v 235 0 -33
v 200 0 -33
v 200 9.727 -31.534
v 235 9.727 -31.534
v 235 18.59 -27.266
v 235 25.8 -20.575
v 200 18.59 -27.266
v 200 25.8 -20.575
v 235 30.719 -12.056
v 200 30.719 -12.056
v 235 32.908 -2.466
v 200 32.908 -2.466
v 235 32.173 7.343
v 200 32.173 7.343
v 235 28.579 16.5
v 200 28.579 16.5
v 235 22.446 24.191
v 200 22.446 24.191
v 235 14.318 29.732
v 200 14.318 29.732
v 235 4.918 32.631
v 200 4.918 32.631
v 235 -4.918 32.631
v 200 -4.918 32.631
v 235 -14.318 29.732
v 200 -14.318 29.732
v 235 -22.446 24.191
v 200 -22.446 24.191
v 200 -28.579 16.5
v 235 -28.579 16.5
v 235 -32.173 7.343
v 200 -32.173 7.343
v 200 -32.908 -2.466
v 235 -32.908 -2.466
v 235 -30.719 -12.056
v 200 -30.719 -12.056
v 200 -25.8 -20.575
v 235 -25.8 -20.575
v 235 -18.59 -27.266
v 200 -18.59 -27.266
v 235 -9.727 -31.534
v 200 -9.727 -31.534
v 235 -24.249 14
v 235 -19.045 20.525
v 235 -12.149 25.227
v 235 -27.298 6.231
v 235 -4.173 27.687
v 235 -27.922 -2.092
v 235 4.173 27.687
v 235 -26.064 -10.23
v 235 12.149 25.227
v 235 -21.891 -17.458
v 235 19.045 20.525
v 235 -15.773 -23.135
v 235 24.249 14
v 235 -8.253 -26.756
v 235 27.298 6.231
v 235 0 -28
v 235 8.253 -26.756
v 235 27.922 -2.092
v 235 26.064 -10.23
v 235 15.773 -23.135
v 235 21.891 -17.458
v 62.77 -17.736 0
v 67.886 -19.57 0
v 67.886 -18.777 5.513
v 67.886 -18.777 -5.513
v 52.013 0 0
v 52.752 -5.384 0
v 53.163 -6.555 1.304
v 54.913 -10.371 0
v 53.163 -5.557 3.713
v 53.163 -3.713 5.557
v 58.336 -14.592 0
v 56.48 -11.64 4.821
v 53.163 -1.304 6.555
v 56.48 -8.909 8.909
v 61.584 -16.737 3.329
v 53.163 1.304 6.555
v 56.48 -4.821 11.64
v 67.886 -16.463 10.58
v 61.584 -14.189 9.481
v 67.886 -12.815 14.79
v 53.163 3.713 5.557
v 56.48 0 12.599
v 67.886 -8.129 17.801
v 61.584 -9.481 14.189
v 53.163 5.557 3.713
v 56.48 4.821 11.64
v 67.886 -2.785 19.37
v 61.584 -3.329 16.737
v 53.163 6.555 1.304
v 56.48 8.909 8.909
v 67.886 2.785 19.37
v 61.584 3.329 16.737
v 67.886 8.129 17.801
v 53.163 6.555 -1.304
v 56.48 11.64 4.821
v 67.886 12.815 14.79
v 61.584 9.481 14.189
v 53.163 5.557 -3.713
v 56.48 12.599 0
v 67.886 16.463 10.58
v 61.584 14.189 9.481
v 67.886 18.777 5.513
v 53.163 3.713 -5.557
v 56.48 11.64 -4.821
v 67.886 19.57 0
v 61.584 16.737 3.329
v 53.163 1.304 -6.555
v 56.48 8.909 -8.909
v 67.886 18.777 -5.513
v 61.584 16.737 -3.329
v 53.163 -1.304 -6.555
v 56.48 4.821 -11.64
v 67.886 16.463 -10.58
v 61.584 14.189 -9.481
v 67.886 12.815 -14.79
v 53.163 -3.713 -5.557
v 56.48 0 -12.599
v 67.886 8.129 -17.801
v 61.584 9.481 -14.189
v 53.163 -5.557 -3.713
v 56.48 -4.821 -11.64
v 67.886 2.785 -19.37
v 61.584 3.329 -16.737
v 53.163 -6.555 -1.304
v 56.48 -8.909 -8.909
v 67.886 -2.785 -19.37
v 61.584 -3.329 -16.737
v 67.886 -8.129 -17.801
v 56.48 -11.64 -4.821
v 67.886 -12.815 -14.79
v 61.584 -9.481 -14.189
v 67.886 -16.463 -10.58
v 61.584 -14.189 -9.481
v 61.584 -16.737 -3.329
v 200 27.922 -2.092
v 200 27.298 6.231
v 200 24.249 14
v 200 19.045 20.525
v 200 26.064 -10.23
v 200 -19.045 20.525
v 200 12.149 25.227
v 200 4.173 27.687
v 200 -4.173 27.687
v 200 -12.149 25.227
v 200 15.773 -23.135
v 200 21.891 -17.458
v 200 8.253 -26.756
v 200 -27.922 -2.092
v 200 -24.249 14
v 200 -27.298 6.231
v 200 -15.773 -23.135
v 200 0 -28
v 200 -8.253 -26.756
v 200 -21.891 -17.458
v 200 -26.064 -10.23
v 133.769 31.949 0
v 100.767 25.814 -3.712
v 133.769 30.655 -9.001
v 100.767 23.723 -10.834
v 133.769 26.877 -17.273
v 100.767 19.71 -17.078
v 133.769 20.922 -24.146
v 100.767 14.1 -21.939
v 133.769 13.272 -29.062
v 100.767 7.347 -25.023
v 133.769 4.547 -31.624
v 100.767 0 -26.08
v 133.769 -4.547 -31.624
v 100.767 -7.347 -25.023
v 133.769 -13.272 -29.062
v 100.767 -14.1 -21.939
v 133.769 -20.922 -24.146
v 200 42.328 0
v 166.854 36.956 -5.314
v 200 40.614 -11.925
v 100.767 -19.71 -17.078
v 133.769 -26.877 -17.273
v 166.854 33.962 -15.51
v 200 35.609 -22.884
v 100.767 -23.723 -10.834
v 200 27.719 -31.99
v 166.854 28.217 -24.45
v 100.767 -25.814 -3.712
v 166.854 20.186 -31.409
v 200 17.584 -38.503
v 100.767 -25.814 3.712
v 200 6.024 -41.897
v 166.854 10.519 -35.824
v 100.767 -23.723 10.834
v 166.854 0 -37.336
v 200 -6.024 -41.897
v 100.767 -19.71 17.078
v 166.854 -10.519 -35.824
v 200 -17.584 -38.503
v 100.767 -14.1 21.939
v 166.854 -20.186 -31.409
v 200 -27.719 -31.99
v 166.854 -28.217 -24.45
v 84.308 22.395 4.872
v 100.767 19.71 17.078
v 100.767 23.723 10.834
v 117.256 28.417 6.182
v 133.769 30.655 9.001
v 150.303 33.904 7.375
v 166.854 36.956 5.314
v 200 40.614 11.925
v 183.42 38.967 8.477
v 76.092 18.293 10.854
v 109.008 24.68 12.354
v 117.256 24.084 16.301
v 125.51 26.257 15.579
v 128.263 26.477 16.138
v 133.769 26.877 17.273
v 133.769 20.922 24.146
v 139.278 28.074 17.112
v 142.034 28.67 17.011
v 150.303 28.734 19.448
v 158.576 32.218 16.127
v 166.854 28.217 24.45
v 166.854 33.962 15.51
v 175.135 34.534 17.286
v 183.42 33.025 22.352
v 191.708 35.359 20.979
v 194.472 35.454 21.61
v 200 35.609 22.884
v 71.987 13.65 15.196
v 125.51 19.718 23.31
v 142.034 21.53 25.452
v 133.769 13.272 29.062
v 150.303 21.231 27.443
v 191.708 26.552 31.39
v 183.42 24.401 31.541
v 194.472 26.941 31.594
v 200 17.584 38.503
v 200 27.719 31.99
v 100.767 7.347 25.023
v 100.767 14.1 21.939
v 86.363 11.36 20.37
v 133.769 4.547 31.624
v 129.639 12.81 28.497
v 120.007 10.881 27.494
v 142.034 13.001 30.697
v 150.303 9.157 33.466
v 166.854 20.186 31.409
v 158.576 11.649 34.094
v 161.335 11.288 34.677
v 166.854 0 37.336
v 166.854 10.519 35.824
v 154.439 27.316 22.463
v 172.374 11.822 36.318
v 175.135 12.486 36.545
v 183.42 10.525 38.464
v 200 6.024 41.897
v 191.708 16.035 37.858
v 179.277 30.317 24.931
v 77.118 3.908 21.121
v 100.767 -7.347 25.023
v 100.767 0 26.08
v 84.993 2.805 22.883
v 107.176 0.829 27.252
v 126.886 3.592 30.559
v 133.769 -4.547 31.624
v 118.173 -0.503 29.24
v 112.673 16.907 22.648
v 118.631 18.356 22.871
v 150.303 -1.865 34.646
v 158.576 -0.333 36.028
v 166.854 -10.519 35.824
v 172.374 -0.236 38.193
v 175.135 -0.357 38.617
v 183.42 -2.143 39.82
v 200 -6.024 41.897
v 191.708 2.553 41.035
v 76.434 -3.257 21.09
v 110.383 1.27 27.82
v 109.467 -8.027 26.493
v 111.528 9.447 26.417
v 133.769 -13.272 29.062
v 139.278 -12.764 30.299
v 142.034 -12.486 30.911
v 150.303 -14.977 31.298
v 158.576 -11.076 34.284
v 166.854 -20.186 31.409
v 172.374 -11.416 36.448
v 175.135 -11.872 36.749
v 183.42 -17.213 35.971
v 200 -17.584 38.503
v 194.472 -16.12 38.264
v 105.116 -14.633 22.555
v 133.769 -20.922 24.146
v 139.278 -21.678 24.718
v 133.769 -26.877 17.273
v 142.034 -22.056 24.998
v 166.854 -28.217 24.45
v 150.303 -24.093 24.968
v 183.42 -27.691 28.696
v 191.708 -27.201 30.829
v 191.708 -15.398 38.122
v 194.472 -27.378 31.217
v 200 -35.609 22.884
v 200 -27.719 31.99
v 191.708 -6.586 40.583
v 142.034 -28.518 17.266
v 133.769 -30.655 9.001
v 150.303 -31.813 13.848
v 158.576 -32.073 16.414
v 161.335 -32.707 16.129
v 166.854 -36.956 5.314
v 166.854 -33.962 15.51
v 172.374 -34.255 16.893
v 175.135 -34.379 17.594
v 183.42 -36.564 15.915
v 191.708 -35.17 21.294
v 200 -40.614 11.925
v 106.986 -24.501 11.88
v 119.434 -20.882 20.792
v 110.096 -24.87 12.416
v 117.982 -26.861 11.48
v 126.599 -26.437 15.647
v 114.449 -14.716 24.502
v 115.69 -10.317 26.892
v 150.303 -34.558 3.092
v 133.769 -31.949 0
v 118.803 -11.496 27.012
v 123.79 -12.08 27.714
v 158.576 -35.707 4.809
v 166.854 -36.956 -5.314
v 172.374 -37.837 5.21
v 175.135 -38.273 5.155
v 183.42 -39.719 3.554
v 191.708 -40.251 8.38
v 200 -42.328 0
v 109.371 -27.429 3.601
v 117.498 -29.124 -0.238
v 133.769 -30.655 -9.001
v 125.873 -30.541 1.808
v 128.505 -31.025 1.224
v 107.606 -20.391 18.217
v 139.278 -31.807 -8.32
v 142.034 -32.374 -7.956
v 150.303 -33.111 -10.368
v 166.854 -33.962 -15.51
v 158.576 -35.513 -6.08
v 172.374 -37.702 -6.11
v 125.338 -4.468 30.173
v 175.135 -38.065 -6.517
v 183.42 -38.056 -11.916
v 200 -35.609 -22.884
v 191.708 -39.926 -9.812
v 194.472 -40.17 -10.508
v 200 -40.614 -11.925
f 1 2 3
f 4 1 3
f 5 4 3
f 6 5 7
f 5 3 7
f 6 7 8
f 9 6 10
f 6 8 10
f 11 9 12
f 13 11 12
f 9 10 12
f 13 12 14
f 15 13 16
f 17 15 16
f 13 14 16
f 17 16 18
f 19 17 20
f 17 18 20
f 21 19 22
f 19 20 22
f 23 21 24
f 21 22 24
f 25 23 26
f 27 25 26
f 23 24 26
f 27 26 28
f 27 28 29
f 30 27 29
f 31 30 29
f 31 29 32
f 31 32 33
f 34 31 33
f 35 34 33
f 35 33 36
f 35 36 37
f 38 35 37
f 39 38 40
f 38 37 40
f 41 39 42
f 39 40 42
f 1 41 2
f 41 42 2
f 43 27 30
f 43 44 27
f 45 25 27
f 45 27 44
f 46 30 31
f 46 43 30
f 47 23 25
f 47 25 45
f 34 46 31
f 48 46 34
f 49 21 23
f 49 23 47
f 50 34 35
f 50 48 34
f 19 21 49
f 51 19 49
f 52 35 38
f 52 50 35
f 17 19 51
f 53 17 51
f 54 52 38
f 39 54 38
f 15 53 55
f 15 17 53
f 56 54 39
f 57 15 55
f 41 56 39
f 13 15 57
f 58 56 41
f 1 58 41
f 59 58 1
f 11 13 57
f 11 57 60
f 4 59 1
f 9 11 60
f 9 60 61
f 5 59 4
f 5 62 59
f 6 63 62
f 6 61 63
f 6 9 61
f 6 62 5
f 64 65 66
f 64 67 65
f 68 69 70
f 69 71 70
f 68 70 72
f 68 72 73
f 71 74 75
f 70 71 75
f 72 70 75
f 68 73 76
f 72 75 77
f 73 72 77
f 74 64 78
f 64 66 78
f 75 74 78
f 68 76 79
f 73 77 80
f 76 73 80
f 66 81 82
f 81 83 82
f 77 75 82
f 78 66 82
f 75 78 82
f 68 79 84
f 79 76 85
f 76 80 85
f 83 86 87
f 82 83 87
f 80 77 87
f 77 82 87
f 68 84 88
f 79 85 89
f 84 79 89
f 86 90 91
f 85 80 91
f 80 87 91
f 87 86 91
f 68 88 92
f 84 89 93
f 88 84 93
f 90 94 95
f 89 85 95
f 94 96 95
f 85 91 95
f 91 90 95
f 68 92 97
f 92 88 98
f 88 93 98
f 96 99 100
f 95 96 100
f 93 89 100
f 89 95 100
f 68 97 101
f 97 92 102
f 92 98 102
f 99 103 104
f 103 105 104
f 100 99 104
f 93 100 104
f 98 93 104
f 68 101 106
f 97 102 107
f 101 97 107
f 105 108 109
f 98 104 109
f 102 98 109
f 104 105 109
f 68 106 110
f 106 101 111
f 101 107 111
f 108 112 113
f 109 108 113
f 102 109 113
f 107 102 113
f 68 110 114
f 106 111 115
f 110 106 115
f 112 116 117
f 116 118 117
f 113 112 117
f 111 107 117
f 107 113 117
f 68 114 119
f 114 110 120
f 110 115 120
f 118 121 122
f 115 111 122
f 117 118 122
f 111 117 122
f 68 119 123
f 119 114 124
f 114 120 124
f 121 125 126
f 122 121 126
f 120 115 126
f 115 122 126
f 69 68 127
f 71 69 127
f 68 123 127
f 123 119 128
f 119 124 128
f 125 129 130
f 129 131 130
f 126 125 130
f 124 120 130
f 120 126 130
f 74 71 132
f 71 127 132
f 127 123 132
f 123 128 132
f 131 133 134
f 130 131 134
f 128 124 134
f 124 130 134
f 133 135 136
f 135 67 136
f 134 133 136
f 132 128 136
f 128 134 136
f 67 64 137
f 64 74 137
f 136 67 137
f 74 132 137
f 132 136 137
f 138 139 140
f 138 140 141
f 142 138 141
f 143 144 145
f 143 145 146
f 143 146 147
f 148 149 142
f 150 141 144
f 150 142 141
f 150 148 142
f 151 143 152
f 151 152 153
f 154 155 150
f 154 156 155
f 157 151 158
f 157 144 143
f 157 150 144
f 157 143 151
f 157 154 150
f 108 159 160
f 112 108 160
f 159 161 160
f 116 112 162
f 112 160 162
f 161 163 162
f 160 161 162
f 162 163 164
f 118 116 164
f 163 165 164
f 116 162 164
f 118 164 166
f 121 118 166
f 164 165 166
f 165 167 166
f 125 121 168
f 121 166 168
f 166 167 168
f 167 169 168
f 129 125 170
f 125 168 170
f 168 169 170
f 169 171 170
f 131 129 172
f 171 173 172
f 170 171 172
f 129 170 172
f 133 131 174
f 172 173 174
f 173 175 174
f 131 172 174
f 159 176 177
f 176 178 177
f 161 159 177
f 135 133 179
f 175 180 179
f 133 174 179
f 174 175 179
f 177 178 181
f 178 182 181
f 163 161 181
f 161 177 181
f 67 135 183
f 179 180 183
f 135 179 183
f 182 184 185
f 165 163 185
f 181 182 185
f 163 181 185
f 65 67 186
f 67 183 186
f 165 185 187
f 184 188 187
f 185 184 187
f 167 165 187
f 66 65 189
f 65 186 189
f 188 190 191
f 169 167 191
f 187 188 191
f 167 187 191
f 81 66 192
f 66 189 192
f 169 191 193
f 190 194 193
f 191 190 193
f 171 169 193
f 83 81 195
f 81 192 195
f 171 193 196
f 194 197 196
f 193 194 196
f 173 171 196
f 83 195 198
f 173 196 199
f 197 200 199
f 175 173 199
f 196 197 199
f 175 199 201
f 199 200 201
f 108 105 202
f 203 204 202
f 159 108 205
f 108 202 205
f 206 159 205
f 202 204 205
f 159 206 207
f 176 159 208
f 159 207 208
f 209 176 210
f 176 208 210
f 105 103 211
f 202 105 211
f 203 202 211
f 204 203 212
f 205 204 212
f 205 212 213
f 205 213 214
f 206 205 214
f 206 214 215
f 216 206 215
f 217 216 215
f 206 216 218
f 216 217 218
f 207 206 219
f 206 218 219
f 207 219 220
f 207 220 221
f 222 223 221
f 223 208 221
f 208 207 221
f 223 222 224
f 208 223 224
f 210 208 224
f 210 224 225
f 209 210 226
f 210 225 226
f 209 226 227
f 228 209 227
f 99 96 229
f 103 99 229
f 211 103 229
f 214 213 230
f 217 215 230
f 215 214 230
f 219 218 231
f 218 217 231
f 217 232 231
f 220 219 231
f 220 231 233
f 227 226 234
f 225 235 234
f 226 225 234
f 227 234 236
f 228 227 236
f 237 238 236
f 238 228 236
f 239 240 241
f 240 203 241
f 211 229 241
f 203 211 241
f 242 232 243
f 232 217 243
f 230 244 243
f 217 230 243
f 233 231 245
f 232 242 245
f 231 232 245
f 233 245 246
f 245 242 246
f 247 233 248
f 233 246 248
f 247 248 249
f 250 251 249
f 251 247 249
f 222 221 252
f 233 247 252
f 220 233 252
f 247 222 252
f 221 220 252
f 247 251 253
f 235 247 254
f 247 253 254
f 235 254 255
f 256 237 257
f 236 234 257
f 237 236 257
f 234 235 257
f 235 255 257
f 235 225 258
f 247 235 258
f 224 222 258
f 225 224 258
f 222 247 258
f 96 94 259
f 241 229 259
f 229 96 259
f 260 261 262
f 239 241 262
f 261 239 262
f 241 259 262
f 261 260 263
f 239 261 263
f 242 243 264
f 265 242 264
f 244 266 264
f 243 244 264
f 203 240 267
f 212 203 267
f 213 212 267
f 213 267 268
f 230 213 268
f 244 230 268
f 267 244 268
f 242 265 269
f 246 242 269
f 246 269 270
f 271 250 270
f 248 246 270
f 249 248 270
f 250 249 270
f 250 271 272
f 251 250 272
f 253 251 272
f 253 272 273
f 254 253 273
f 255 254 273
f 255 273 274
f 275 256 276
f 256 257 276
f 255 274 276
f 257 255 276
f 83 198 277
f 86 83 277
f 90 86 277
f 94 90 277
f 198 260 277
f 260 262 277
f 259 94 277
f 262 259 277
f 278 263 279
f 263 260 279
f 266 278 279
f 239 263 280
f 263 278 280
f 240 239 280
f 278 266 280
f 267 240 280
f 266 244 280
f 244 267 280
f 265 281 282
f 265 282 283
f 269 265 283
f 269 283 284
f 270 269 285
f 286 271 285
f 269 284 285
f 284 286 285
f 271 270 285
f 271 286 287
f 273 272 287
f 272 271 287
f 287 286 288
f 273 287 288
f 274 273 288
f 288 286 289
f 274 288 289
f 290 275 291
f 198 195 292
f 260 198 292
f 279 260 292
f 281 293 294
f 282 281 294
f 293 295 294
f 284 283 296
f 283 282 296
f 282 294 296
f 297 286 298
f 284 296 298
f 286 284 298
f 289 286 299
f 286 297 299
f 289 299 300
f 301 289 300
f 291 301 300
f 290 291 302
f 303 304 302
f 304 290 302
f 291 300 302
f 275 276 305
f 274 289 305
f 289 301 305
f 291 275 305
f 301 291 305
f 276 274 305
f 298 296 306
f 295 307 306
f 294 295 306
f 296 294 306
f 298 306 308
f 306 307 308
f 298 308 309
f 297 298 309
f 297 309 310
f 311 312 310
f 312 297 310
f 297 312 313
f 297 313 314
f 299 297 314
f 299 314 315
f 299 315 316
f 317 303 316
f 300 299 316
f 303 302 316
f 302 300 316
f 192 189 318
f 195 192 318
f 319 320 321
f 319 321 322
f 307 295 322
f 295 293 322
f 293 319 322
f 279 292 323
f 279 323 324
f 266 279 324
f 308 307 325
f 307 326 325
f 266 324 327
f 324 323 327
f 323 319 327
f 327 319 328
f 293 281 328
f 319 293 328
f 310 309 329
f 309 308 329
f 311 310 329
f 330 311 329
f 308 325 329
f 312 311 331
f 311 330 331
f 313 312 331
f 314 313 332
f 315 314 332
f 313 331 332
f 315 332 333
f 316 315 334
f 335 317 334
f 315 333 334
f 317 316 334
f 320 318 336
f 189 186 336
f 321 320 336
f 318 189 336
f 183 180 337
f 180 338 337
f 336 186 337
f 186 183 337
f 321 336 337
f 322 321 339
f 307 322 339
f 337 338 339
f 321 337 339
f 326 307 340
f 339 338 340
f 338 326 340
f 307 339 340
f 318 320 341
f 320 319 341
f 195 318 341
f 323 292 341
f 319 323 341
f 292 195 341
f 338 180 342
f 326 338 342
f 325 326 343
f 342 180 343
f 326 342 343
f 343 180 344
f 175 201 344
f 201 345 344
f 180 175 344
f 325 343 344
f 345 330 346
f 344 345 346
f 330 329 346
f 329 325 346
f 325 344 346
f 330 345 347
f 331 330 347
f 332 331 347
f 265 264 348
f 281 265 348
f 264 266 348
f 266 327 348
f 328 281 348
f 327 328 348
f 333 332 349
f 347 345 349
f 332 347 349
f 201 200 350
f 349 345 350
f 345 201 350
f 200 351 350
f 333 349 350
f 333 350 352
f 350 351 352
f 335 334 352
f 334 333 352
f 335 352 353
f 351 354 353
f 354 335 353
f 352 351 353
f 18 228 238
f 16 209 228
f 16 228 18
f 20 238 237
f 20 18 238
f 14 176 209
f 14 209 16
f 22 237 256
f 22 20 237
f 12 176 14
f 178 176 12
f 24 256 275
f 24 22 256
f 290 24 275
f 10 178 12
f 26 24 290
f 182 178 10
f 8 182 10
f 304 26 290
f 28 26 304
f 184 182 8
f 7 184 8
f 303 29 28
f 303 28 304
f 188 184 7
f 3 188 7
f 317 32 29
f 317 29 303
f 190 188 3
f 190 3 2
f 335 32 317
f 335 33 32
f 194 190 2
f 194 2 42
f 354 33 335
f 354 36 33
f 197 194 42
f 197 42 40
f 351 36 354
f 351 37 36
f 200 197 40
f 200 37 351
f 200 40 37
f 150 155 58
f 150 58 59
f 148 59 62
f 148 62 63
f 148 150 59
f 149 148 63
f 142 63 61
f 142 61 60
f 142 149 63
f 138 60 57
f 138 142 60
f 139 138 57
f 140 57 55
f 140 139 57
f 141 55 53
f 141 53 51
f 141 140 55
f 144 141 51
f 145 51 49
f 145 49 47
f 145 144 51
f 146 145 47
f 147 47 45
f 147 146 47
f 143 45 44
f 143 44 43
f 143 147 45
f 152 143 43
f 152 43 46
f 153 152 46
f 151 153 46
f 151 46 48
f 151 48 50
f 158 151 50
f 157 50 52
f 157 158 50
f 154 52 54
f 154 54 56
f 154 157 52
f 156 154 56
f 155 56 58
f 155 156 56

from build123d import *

# Parameters (mm, degrees)
SKETCH3_R           = 33
SKETCH3_R_2         = 28
BOSS_EXTRUDE1_DEPTH = 35


with BuildPart() as part:
    # Sketch1 → Revolve1 (revolve)
    with BuildSketch(Plane.XY):
        with BuildLine():
            Line((200, 0), (200, 42.32828037))
            add(Edge.make_bspline(
                [(67.88595875, 19.569501359), (71.843085895, 20.404078353), (85.043129663, 23.124182603), (107.543506327, 27.445507457), (139.404169497, 33.021435572), (168.514660807, 37.655823826), (188.335942781, 40.630483181), (198.835243463, 42.159255501), (200, 42.32828037)],
                knots=[0.116883244, 0.116883244, 0.116883244, 0.116883244, 0.116883244, 0.143539857, 0.205716573, 0.267893284, 0.330069995, 0.337827743, 0.337827743, 0.337827743, 0.337827743, 0.337827743], degree=4))
            ThreePointArc((67.88595875, 19.569501359), (56.48029473, 12.598689867), (52.013260114, 0))
            Line((52.013260114, 0), (200, 0))
        make_face()
    revolve(axis=Axis((806.72, 0, 0), (-1, 0, 0)))

    # Sketch3 → Boss-Extrude1 (add)
    with BuildSketch(Plane(origin=(200, 0, 0), x_dir=(0, 0, -1), z_dir=(1, 0, 0))):
        Circle(SKETCH3_R)
        Circle(SKETCH3_R_2, mode=Mode.SUBTRACT)
    extrude(amount=BOSS_EXTRUDE1_DEPTH)


solid = part.part
